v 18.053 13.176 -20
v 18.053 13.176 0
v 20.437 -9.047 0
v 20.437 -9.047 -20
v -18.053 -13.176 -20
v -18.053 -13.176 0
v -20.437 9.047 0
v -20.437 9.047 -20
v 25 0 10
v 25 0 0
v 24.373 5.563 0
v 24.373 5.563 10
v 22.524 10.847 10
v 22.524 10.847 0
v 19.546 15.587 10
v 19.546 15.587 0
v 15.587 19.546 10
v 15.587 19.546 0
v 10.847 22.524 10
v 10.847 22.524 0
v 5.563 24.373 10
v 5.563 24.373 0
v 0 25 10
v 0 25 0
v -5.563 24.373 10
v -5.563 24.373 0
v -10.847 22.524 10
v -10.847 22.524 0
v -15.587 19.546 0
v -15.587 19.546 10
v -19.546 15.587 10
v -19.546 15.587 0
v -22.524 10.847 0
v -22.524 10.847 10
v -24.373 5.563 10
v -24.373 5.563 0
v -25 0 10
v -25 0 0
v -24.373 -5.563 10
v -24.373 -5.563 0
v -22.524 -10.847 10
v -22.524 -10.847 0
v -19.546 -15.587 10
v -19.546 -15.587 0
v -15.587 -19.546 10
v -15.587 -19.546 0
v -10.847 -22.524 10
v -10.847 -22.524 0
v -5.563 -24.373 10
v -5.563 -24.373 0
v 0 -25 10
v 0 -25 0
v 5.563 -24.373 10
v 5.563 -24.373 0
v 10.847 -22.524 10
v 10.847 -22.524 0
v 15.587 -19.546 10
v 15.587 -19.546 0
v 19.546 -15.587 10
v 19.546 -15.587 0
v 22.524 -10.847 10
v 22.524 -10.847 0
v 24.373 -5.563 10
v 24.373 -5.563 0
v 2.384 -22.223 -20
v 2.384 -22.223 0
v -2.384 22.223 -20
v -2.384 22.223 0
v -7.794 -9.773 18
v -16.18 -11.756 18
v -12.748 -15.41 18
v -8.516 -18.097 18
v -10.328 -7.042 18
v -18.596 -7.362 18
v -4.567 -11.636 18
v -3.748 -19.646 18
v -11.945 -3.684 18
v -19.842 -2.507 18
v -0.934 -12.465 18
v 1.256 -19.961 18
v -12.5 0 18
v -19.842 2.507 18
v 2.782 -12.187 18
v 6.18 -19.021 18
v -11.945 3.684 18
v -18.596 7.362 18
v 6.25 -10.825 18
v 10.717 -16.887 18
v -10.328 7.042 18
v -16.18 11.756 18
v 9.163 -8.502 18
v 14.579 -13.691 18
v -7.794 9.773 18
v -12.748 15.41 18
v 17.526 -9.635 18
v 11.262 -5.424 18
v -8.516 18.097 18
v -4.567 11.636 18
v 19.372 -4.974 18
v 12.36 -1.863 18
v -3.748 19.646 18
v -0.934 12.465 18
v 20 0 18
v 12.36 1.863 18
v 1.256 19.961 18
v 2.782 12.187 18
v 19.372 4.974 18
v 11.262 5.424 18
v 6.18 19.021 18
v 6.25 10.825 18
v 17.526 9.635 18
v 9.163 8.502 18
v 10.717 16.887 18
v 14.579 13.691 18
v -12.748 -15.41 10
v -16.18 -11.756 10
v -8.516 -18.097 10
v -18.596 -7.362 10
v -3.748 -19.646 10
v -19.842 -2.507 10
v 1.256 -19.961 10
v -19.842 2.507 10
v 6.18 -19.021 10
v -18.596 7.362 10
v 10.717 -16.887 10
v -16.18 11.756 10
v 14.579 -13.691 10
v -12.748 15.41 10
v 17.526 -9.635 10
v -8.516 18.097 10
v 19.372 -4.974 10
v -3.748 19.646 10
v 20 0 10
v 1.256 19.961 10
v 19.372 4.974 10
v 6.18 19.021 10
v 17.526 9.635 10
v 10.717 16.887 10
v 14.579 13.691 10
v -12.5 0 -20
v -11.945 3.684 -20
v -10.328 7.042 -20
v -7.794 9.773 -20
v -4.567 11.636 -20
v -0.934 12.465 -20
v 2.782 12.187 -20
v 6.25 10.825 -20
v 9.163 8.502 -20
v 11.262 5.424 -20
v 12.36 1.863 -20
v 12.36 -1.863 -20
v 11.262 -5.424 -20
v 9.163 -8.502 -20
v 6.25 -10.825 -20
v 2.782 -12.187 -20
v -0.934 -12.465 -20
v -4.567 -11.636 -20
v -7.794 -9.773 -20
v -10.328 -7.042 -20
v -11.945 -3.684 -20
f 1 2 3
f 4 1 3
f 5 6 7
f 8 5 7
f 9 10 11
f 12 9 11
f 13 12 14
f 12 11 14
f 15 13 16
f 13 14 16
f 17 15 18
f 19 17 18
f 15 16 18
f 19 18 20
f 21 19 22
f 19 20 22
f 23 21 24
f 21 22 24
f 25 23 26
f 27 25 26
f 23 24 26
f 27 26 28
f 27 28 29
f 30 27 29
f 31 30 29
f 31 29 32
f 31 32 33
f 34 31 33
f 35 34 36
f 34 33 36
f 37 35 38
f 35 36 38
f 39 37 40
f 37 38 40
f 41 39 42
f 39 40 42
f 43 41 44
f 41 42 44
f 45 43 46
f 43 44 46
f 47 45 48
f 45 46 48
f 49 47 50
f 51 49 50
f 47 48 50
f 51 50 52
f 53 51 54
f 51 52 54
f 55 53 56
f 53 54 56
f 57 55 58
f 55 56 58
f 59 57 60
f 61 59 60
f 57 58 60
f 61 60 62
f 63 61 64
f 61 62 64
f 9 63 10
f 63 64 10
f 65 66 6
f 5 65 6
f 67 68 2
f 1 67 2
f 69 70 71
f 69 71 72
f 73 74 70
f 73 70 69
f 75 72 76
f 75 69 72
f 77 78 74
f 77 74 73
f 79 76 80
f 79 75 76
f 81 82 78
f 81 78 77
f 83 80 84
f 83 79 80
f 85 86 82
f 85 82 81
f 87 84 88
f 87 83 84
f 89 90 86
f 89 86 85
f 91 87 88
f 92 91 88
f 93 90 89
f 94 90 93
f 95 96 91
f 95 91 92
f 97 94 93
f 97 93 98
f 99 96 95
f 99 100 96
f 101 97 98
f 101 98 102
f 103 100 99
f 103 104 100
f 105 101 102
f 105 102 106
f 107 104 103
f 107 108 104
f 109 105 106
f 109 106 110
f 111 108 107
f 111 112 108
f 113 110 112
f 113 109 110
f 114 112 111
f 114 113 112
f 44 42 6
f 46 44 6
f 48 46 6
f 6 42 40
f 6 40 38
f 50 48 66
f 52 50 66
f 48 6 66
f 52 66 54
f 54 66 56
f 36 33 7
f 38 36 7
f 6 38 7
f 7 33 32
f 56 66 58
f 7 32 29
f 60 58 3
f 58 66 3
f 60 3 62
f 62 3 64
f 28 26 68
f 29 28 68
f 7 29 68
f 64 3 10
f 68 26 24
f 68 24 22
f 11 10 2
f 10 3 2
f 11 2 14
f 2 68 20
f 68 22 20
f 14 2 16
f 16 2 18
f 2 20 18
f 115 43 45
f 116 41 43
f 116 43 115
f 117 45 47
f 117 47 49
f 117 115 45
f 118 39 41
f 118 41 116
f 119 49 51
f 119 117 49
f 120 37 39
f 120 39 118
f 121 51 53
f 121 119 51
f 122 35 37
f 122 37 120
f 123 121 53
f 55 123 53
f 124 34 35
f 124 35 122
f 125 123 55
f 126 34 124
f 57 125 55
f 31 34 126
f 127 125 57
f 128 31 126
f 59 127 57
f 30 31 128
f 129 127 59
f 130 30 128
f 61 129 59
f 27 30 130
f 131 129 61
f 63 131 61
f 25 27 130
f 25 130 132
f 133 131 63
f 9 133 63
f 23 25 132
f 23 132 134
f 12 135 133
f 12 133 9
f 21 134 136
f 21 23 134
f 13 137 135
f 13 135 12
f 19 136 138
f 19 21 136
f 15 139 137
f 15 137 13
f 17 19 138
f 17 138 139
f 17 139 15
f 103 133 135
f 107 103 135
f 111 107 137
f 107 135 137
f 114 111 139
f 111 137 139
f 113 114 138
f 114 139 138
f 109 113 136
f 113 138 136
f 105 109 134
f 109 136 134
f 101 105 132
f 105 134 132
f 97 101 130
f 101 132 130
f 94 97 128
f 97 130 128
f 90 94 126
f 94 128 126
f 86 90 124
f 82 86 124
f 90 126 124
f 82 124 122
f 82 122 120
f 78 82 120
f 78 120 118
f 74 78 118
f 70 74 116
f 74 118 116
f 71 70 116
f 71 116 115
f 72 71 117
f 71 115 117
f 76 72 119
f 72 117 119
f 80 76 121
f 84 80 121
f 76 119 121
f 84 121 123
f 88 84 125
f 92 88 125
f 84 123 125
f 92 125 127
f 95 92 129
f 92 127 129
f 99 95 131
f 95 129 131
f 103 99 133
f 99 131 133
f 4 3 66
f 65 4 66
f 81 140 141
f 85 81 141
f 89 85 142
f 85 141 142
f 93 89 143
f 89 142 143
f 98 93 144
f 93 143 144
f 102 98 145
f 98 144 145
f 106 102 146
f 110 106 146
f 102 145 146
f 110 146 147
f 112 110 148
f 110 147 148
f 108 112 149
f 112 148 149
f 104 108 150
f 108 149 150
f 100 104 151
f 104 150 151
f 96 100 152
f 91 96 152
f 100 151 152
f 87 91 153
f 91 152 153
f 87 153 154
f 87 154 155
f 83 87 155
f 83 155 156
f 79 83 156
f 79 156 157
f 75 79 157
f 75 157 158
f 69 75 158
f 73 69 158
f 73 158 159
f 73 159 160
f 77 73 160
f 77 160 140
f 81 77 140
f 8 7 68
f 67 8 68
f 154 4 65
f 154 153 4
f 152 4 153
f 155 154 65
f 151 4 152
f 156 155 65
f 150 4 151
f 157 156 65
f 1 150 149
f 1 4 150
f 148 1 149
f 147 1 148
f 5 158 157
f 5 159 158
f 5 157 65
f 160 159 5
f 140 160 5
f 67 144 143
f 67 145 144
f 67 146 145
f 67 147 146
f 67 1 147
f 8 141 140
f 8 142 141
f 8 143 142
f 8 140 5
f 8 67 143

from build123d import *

# Parameters (mm, degrees)
SKETCH2_R           = 25
BOSS_EXTRUDE1_DEPTH = 10
SKETCH3_R           = 20
BOSS_EXTRUDE2_DEPTH = 8
BOSS_EXTRUDE3_DEPTH = 20
SKETCH5_R           = 12.5
CUT_EXTRUDE1_DEPTH  = 52.903757089


with BuildPart() as part:
    # Sketch2 → Boss-Extrude1 (new body)
    with BuildSketch(Plane.XY):
        Circle(SKETCH2_R)
    extrude(amount=BOSS_EXTRUDE1_DEPTH)

    # Sketch3 → Boss-Extrude2 (add)
    with BuildSketch(Plane.XY.offset(10)):
        Circle(SKETCH3_R)
    extrude(amount=BOSS_EXTRUDE2_DEPTH)

    # Sketch4 → Boss-Extrude3 (add)
    with BuildSketch(Plane(origin=(0, 0, 0), x_dir=(-1, 0, 0), z_dir=(0, 0, -1))):
        Polygon((-20.437108974, -9.047000469), (-2.383622252, -22.222555786), (18.053486721, -13.175555316), (20.437108974, 9.047000469), (2.383622252, 22.222555786), (-18.053486721, 13.175555316), align=None)
    extrude(amount=BOSS_EXTRUDE3_DEPTH)

    # Sketch5 → Cut-Extrude1 (cut, through all)
    with BuildSketch(Plane(origin=(0, 0, -20), x_dir=(-1, 0, 0), z_dir=(0, 0, -1))):
        Circle(SKETCH5_R)
    extrude(amount=-CUT_EXTRUDE1_DEPTH, mode=Mode.SUBTRACT)


solid = part.part
